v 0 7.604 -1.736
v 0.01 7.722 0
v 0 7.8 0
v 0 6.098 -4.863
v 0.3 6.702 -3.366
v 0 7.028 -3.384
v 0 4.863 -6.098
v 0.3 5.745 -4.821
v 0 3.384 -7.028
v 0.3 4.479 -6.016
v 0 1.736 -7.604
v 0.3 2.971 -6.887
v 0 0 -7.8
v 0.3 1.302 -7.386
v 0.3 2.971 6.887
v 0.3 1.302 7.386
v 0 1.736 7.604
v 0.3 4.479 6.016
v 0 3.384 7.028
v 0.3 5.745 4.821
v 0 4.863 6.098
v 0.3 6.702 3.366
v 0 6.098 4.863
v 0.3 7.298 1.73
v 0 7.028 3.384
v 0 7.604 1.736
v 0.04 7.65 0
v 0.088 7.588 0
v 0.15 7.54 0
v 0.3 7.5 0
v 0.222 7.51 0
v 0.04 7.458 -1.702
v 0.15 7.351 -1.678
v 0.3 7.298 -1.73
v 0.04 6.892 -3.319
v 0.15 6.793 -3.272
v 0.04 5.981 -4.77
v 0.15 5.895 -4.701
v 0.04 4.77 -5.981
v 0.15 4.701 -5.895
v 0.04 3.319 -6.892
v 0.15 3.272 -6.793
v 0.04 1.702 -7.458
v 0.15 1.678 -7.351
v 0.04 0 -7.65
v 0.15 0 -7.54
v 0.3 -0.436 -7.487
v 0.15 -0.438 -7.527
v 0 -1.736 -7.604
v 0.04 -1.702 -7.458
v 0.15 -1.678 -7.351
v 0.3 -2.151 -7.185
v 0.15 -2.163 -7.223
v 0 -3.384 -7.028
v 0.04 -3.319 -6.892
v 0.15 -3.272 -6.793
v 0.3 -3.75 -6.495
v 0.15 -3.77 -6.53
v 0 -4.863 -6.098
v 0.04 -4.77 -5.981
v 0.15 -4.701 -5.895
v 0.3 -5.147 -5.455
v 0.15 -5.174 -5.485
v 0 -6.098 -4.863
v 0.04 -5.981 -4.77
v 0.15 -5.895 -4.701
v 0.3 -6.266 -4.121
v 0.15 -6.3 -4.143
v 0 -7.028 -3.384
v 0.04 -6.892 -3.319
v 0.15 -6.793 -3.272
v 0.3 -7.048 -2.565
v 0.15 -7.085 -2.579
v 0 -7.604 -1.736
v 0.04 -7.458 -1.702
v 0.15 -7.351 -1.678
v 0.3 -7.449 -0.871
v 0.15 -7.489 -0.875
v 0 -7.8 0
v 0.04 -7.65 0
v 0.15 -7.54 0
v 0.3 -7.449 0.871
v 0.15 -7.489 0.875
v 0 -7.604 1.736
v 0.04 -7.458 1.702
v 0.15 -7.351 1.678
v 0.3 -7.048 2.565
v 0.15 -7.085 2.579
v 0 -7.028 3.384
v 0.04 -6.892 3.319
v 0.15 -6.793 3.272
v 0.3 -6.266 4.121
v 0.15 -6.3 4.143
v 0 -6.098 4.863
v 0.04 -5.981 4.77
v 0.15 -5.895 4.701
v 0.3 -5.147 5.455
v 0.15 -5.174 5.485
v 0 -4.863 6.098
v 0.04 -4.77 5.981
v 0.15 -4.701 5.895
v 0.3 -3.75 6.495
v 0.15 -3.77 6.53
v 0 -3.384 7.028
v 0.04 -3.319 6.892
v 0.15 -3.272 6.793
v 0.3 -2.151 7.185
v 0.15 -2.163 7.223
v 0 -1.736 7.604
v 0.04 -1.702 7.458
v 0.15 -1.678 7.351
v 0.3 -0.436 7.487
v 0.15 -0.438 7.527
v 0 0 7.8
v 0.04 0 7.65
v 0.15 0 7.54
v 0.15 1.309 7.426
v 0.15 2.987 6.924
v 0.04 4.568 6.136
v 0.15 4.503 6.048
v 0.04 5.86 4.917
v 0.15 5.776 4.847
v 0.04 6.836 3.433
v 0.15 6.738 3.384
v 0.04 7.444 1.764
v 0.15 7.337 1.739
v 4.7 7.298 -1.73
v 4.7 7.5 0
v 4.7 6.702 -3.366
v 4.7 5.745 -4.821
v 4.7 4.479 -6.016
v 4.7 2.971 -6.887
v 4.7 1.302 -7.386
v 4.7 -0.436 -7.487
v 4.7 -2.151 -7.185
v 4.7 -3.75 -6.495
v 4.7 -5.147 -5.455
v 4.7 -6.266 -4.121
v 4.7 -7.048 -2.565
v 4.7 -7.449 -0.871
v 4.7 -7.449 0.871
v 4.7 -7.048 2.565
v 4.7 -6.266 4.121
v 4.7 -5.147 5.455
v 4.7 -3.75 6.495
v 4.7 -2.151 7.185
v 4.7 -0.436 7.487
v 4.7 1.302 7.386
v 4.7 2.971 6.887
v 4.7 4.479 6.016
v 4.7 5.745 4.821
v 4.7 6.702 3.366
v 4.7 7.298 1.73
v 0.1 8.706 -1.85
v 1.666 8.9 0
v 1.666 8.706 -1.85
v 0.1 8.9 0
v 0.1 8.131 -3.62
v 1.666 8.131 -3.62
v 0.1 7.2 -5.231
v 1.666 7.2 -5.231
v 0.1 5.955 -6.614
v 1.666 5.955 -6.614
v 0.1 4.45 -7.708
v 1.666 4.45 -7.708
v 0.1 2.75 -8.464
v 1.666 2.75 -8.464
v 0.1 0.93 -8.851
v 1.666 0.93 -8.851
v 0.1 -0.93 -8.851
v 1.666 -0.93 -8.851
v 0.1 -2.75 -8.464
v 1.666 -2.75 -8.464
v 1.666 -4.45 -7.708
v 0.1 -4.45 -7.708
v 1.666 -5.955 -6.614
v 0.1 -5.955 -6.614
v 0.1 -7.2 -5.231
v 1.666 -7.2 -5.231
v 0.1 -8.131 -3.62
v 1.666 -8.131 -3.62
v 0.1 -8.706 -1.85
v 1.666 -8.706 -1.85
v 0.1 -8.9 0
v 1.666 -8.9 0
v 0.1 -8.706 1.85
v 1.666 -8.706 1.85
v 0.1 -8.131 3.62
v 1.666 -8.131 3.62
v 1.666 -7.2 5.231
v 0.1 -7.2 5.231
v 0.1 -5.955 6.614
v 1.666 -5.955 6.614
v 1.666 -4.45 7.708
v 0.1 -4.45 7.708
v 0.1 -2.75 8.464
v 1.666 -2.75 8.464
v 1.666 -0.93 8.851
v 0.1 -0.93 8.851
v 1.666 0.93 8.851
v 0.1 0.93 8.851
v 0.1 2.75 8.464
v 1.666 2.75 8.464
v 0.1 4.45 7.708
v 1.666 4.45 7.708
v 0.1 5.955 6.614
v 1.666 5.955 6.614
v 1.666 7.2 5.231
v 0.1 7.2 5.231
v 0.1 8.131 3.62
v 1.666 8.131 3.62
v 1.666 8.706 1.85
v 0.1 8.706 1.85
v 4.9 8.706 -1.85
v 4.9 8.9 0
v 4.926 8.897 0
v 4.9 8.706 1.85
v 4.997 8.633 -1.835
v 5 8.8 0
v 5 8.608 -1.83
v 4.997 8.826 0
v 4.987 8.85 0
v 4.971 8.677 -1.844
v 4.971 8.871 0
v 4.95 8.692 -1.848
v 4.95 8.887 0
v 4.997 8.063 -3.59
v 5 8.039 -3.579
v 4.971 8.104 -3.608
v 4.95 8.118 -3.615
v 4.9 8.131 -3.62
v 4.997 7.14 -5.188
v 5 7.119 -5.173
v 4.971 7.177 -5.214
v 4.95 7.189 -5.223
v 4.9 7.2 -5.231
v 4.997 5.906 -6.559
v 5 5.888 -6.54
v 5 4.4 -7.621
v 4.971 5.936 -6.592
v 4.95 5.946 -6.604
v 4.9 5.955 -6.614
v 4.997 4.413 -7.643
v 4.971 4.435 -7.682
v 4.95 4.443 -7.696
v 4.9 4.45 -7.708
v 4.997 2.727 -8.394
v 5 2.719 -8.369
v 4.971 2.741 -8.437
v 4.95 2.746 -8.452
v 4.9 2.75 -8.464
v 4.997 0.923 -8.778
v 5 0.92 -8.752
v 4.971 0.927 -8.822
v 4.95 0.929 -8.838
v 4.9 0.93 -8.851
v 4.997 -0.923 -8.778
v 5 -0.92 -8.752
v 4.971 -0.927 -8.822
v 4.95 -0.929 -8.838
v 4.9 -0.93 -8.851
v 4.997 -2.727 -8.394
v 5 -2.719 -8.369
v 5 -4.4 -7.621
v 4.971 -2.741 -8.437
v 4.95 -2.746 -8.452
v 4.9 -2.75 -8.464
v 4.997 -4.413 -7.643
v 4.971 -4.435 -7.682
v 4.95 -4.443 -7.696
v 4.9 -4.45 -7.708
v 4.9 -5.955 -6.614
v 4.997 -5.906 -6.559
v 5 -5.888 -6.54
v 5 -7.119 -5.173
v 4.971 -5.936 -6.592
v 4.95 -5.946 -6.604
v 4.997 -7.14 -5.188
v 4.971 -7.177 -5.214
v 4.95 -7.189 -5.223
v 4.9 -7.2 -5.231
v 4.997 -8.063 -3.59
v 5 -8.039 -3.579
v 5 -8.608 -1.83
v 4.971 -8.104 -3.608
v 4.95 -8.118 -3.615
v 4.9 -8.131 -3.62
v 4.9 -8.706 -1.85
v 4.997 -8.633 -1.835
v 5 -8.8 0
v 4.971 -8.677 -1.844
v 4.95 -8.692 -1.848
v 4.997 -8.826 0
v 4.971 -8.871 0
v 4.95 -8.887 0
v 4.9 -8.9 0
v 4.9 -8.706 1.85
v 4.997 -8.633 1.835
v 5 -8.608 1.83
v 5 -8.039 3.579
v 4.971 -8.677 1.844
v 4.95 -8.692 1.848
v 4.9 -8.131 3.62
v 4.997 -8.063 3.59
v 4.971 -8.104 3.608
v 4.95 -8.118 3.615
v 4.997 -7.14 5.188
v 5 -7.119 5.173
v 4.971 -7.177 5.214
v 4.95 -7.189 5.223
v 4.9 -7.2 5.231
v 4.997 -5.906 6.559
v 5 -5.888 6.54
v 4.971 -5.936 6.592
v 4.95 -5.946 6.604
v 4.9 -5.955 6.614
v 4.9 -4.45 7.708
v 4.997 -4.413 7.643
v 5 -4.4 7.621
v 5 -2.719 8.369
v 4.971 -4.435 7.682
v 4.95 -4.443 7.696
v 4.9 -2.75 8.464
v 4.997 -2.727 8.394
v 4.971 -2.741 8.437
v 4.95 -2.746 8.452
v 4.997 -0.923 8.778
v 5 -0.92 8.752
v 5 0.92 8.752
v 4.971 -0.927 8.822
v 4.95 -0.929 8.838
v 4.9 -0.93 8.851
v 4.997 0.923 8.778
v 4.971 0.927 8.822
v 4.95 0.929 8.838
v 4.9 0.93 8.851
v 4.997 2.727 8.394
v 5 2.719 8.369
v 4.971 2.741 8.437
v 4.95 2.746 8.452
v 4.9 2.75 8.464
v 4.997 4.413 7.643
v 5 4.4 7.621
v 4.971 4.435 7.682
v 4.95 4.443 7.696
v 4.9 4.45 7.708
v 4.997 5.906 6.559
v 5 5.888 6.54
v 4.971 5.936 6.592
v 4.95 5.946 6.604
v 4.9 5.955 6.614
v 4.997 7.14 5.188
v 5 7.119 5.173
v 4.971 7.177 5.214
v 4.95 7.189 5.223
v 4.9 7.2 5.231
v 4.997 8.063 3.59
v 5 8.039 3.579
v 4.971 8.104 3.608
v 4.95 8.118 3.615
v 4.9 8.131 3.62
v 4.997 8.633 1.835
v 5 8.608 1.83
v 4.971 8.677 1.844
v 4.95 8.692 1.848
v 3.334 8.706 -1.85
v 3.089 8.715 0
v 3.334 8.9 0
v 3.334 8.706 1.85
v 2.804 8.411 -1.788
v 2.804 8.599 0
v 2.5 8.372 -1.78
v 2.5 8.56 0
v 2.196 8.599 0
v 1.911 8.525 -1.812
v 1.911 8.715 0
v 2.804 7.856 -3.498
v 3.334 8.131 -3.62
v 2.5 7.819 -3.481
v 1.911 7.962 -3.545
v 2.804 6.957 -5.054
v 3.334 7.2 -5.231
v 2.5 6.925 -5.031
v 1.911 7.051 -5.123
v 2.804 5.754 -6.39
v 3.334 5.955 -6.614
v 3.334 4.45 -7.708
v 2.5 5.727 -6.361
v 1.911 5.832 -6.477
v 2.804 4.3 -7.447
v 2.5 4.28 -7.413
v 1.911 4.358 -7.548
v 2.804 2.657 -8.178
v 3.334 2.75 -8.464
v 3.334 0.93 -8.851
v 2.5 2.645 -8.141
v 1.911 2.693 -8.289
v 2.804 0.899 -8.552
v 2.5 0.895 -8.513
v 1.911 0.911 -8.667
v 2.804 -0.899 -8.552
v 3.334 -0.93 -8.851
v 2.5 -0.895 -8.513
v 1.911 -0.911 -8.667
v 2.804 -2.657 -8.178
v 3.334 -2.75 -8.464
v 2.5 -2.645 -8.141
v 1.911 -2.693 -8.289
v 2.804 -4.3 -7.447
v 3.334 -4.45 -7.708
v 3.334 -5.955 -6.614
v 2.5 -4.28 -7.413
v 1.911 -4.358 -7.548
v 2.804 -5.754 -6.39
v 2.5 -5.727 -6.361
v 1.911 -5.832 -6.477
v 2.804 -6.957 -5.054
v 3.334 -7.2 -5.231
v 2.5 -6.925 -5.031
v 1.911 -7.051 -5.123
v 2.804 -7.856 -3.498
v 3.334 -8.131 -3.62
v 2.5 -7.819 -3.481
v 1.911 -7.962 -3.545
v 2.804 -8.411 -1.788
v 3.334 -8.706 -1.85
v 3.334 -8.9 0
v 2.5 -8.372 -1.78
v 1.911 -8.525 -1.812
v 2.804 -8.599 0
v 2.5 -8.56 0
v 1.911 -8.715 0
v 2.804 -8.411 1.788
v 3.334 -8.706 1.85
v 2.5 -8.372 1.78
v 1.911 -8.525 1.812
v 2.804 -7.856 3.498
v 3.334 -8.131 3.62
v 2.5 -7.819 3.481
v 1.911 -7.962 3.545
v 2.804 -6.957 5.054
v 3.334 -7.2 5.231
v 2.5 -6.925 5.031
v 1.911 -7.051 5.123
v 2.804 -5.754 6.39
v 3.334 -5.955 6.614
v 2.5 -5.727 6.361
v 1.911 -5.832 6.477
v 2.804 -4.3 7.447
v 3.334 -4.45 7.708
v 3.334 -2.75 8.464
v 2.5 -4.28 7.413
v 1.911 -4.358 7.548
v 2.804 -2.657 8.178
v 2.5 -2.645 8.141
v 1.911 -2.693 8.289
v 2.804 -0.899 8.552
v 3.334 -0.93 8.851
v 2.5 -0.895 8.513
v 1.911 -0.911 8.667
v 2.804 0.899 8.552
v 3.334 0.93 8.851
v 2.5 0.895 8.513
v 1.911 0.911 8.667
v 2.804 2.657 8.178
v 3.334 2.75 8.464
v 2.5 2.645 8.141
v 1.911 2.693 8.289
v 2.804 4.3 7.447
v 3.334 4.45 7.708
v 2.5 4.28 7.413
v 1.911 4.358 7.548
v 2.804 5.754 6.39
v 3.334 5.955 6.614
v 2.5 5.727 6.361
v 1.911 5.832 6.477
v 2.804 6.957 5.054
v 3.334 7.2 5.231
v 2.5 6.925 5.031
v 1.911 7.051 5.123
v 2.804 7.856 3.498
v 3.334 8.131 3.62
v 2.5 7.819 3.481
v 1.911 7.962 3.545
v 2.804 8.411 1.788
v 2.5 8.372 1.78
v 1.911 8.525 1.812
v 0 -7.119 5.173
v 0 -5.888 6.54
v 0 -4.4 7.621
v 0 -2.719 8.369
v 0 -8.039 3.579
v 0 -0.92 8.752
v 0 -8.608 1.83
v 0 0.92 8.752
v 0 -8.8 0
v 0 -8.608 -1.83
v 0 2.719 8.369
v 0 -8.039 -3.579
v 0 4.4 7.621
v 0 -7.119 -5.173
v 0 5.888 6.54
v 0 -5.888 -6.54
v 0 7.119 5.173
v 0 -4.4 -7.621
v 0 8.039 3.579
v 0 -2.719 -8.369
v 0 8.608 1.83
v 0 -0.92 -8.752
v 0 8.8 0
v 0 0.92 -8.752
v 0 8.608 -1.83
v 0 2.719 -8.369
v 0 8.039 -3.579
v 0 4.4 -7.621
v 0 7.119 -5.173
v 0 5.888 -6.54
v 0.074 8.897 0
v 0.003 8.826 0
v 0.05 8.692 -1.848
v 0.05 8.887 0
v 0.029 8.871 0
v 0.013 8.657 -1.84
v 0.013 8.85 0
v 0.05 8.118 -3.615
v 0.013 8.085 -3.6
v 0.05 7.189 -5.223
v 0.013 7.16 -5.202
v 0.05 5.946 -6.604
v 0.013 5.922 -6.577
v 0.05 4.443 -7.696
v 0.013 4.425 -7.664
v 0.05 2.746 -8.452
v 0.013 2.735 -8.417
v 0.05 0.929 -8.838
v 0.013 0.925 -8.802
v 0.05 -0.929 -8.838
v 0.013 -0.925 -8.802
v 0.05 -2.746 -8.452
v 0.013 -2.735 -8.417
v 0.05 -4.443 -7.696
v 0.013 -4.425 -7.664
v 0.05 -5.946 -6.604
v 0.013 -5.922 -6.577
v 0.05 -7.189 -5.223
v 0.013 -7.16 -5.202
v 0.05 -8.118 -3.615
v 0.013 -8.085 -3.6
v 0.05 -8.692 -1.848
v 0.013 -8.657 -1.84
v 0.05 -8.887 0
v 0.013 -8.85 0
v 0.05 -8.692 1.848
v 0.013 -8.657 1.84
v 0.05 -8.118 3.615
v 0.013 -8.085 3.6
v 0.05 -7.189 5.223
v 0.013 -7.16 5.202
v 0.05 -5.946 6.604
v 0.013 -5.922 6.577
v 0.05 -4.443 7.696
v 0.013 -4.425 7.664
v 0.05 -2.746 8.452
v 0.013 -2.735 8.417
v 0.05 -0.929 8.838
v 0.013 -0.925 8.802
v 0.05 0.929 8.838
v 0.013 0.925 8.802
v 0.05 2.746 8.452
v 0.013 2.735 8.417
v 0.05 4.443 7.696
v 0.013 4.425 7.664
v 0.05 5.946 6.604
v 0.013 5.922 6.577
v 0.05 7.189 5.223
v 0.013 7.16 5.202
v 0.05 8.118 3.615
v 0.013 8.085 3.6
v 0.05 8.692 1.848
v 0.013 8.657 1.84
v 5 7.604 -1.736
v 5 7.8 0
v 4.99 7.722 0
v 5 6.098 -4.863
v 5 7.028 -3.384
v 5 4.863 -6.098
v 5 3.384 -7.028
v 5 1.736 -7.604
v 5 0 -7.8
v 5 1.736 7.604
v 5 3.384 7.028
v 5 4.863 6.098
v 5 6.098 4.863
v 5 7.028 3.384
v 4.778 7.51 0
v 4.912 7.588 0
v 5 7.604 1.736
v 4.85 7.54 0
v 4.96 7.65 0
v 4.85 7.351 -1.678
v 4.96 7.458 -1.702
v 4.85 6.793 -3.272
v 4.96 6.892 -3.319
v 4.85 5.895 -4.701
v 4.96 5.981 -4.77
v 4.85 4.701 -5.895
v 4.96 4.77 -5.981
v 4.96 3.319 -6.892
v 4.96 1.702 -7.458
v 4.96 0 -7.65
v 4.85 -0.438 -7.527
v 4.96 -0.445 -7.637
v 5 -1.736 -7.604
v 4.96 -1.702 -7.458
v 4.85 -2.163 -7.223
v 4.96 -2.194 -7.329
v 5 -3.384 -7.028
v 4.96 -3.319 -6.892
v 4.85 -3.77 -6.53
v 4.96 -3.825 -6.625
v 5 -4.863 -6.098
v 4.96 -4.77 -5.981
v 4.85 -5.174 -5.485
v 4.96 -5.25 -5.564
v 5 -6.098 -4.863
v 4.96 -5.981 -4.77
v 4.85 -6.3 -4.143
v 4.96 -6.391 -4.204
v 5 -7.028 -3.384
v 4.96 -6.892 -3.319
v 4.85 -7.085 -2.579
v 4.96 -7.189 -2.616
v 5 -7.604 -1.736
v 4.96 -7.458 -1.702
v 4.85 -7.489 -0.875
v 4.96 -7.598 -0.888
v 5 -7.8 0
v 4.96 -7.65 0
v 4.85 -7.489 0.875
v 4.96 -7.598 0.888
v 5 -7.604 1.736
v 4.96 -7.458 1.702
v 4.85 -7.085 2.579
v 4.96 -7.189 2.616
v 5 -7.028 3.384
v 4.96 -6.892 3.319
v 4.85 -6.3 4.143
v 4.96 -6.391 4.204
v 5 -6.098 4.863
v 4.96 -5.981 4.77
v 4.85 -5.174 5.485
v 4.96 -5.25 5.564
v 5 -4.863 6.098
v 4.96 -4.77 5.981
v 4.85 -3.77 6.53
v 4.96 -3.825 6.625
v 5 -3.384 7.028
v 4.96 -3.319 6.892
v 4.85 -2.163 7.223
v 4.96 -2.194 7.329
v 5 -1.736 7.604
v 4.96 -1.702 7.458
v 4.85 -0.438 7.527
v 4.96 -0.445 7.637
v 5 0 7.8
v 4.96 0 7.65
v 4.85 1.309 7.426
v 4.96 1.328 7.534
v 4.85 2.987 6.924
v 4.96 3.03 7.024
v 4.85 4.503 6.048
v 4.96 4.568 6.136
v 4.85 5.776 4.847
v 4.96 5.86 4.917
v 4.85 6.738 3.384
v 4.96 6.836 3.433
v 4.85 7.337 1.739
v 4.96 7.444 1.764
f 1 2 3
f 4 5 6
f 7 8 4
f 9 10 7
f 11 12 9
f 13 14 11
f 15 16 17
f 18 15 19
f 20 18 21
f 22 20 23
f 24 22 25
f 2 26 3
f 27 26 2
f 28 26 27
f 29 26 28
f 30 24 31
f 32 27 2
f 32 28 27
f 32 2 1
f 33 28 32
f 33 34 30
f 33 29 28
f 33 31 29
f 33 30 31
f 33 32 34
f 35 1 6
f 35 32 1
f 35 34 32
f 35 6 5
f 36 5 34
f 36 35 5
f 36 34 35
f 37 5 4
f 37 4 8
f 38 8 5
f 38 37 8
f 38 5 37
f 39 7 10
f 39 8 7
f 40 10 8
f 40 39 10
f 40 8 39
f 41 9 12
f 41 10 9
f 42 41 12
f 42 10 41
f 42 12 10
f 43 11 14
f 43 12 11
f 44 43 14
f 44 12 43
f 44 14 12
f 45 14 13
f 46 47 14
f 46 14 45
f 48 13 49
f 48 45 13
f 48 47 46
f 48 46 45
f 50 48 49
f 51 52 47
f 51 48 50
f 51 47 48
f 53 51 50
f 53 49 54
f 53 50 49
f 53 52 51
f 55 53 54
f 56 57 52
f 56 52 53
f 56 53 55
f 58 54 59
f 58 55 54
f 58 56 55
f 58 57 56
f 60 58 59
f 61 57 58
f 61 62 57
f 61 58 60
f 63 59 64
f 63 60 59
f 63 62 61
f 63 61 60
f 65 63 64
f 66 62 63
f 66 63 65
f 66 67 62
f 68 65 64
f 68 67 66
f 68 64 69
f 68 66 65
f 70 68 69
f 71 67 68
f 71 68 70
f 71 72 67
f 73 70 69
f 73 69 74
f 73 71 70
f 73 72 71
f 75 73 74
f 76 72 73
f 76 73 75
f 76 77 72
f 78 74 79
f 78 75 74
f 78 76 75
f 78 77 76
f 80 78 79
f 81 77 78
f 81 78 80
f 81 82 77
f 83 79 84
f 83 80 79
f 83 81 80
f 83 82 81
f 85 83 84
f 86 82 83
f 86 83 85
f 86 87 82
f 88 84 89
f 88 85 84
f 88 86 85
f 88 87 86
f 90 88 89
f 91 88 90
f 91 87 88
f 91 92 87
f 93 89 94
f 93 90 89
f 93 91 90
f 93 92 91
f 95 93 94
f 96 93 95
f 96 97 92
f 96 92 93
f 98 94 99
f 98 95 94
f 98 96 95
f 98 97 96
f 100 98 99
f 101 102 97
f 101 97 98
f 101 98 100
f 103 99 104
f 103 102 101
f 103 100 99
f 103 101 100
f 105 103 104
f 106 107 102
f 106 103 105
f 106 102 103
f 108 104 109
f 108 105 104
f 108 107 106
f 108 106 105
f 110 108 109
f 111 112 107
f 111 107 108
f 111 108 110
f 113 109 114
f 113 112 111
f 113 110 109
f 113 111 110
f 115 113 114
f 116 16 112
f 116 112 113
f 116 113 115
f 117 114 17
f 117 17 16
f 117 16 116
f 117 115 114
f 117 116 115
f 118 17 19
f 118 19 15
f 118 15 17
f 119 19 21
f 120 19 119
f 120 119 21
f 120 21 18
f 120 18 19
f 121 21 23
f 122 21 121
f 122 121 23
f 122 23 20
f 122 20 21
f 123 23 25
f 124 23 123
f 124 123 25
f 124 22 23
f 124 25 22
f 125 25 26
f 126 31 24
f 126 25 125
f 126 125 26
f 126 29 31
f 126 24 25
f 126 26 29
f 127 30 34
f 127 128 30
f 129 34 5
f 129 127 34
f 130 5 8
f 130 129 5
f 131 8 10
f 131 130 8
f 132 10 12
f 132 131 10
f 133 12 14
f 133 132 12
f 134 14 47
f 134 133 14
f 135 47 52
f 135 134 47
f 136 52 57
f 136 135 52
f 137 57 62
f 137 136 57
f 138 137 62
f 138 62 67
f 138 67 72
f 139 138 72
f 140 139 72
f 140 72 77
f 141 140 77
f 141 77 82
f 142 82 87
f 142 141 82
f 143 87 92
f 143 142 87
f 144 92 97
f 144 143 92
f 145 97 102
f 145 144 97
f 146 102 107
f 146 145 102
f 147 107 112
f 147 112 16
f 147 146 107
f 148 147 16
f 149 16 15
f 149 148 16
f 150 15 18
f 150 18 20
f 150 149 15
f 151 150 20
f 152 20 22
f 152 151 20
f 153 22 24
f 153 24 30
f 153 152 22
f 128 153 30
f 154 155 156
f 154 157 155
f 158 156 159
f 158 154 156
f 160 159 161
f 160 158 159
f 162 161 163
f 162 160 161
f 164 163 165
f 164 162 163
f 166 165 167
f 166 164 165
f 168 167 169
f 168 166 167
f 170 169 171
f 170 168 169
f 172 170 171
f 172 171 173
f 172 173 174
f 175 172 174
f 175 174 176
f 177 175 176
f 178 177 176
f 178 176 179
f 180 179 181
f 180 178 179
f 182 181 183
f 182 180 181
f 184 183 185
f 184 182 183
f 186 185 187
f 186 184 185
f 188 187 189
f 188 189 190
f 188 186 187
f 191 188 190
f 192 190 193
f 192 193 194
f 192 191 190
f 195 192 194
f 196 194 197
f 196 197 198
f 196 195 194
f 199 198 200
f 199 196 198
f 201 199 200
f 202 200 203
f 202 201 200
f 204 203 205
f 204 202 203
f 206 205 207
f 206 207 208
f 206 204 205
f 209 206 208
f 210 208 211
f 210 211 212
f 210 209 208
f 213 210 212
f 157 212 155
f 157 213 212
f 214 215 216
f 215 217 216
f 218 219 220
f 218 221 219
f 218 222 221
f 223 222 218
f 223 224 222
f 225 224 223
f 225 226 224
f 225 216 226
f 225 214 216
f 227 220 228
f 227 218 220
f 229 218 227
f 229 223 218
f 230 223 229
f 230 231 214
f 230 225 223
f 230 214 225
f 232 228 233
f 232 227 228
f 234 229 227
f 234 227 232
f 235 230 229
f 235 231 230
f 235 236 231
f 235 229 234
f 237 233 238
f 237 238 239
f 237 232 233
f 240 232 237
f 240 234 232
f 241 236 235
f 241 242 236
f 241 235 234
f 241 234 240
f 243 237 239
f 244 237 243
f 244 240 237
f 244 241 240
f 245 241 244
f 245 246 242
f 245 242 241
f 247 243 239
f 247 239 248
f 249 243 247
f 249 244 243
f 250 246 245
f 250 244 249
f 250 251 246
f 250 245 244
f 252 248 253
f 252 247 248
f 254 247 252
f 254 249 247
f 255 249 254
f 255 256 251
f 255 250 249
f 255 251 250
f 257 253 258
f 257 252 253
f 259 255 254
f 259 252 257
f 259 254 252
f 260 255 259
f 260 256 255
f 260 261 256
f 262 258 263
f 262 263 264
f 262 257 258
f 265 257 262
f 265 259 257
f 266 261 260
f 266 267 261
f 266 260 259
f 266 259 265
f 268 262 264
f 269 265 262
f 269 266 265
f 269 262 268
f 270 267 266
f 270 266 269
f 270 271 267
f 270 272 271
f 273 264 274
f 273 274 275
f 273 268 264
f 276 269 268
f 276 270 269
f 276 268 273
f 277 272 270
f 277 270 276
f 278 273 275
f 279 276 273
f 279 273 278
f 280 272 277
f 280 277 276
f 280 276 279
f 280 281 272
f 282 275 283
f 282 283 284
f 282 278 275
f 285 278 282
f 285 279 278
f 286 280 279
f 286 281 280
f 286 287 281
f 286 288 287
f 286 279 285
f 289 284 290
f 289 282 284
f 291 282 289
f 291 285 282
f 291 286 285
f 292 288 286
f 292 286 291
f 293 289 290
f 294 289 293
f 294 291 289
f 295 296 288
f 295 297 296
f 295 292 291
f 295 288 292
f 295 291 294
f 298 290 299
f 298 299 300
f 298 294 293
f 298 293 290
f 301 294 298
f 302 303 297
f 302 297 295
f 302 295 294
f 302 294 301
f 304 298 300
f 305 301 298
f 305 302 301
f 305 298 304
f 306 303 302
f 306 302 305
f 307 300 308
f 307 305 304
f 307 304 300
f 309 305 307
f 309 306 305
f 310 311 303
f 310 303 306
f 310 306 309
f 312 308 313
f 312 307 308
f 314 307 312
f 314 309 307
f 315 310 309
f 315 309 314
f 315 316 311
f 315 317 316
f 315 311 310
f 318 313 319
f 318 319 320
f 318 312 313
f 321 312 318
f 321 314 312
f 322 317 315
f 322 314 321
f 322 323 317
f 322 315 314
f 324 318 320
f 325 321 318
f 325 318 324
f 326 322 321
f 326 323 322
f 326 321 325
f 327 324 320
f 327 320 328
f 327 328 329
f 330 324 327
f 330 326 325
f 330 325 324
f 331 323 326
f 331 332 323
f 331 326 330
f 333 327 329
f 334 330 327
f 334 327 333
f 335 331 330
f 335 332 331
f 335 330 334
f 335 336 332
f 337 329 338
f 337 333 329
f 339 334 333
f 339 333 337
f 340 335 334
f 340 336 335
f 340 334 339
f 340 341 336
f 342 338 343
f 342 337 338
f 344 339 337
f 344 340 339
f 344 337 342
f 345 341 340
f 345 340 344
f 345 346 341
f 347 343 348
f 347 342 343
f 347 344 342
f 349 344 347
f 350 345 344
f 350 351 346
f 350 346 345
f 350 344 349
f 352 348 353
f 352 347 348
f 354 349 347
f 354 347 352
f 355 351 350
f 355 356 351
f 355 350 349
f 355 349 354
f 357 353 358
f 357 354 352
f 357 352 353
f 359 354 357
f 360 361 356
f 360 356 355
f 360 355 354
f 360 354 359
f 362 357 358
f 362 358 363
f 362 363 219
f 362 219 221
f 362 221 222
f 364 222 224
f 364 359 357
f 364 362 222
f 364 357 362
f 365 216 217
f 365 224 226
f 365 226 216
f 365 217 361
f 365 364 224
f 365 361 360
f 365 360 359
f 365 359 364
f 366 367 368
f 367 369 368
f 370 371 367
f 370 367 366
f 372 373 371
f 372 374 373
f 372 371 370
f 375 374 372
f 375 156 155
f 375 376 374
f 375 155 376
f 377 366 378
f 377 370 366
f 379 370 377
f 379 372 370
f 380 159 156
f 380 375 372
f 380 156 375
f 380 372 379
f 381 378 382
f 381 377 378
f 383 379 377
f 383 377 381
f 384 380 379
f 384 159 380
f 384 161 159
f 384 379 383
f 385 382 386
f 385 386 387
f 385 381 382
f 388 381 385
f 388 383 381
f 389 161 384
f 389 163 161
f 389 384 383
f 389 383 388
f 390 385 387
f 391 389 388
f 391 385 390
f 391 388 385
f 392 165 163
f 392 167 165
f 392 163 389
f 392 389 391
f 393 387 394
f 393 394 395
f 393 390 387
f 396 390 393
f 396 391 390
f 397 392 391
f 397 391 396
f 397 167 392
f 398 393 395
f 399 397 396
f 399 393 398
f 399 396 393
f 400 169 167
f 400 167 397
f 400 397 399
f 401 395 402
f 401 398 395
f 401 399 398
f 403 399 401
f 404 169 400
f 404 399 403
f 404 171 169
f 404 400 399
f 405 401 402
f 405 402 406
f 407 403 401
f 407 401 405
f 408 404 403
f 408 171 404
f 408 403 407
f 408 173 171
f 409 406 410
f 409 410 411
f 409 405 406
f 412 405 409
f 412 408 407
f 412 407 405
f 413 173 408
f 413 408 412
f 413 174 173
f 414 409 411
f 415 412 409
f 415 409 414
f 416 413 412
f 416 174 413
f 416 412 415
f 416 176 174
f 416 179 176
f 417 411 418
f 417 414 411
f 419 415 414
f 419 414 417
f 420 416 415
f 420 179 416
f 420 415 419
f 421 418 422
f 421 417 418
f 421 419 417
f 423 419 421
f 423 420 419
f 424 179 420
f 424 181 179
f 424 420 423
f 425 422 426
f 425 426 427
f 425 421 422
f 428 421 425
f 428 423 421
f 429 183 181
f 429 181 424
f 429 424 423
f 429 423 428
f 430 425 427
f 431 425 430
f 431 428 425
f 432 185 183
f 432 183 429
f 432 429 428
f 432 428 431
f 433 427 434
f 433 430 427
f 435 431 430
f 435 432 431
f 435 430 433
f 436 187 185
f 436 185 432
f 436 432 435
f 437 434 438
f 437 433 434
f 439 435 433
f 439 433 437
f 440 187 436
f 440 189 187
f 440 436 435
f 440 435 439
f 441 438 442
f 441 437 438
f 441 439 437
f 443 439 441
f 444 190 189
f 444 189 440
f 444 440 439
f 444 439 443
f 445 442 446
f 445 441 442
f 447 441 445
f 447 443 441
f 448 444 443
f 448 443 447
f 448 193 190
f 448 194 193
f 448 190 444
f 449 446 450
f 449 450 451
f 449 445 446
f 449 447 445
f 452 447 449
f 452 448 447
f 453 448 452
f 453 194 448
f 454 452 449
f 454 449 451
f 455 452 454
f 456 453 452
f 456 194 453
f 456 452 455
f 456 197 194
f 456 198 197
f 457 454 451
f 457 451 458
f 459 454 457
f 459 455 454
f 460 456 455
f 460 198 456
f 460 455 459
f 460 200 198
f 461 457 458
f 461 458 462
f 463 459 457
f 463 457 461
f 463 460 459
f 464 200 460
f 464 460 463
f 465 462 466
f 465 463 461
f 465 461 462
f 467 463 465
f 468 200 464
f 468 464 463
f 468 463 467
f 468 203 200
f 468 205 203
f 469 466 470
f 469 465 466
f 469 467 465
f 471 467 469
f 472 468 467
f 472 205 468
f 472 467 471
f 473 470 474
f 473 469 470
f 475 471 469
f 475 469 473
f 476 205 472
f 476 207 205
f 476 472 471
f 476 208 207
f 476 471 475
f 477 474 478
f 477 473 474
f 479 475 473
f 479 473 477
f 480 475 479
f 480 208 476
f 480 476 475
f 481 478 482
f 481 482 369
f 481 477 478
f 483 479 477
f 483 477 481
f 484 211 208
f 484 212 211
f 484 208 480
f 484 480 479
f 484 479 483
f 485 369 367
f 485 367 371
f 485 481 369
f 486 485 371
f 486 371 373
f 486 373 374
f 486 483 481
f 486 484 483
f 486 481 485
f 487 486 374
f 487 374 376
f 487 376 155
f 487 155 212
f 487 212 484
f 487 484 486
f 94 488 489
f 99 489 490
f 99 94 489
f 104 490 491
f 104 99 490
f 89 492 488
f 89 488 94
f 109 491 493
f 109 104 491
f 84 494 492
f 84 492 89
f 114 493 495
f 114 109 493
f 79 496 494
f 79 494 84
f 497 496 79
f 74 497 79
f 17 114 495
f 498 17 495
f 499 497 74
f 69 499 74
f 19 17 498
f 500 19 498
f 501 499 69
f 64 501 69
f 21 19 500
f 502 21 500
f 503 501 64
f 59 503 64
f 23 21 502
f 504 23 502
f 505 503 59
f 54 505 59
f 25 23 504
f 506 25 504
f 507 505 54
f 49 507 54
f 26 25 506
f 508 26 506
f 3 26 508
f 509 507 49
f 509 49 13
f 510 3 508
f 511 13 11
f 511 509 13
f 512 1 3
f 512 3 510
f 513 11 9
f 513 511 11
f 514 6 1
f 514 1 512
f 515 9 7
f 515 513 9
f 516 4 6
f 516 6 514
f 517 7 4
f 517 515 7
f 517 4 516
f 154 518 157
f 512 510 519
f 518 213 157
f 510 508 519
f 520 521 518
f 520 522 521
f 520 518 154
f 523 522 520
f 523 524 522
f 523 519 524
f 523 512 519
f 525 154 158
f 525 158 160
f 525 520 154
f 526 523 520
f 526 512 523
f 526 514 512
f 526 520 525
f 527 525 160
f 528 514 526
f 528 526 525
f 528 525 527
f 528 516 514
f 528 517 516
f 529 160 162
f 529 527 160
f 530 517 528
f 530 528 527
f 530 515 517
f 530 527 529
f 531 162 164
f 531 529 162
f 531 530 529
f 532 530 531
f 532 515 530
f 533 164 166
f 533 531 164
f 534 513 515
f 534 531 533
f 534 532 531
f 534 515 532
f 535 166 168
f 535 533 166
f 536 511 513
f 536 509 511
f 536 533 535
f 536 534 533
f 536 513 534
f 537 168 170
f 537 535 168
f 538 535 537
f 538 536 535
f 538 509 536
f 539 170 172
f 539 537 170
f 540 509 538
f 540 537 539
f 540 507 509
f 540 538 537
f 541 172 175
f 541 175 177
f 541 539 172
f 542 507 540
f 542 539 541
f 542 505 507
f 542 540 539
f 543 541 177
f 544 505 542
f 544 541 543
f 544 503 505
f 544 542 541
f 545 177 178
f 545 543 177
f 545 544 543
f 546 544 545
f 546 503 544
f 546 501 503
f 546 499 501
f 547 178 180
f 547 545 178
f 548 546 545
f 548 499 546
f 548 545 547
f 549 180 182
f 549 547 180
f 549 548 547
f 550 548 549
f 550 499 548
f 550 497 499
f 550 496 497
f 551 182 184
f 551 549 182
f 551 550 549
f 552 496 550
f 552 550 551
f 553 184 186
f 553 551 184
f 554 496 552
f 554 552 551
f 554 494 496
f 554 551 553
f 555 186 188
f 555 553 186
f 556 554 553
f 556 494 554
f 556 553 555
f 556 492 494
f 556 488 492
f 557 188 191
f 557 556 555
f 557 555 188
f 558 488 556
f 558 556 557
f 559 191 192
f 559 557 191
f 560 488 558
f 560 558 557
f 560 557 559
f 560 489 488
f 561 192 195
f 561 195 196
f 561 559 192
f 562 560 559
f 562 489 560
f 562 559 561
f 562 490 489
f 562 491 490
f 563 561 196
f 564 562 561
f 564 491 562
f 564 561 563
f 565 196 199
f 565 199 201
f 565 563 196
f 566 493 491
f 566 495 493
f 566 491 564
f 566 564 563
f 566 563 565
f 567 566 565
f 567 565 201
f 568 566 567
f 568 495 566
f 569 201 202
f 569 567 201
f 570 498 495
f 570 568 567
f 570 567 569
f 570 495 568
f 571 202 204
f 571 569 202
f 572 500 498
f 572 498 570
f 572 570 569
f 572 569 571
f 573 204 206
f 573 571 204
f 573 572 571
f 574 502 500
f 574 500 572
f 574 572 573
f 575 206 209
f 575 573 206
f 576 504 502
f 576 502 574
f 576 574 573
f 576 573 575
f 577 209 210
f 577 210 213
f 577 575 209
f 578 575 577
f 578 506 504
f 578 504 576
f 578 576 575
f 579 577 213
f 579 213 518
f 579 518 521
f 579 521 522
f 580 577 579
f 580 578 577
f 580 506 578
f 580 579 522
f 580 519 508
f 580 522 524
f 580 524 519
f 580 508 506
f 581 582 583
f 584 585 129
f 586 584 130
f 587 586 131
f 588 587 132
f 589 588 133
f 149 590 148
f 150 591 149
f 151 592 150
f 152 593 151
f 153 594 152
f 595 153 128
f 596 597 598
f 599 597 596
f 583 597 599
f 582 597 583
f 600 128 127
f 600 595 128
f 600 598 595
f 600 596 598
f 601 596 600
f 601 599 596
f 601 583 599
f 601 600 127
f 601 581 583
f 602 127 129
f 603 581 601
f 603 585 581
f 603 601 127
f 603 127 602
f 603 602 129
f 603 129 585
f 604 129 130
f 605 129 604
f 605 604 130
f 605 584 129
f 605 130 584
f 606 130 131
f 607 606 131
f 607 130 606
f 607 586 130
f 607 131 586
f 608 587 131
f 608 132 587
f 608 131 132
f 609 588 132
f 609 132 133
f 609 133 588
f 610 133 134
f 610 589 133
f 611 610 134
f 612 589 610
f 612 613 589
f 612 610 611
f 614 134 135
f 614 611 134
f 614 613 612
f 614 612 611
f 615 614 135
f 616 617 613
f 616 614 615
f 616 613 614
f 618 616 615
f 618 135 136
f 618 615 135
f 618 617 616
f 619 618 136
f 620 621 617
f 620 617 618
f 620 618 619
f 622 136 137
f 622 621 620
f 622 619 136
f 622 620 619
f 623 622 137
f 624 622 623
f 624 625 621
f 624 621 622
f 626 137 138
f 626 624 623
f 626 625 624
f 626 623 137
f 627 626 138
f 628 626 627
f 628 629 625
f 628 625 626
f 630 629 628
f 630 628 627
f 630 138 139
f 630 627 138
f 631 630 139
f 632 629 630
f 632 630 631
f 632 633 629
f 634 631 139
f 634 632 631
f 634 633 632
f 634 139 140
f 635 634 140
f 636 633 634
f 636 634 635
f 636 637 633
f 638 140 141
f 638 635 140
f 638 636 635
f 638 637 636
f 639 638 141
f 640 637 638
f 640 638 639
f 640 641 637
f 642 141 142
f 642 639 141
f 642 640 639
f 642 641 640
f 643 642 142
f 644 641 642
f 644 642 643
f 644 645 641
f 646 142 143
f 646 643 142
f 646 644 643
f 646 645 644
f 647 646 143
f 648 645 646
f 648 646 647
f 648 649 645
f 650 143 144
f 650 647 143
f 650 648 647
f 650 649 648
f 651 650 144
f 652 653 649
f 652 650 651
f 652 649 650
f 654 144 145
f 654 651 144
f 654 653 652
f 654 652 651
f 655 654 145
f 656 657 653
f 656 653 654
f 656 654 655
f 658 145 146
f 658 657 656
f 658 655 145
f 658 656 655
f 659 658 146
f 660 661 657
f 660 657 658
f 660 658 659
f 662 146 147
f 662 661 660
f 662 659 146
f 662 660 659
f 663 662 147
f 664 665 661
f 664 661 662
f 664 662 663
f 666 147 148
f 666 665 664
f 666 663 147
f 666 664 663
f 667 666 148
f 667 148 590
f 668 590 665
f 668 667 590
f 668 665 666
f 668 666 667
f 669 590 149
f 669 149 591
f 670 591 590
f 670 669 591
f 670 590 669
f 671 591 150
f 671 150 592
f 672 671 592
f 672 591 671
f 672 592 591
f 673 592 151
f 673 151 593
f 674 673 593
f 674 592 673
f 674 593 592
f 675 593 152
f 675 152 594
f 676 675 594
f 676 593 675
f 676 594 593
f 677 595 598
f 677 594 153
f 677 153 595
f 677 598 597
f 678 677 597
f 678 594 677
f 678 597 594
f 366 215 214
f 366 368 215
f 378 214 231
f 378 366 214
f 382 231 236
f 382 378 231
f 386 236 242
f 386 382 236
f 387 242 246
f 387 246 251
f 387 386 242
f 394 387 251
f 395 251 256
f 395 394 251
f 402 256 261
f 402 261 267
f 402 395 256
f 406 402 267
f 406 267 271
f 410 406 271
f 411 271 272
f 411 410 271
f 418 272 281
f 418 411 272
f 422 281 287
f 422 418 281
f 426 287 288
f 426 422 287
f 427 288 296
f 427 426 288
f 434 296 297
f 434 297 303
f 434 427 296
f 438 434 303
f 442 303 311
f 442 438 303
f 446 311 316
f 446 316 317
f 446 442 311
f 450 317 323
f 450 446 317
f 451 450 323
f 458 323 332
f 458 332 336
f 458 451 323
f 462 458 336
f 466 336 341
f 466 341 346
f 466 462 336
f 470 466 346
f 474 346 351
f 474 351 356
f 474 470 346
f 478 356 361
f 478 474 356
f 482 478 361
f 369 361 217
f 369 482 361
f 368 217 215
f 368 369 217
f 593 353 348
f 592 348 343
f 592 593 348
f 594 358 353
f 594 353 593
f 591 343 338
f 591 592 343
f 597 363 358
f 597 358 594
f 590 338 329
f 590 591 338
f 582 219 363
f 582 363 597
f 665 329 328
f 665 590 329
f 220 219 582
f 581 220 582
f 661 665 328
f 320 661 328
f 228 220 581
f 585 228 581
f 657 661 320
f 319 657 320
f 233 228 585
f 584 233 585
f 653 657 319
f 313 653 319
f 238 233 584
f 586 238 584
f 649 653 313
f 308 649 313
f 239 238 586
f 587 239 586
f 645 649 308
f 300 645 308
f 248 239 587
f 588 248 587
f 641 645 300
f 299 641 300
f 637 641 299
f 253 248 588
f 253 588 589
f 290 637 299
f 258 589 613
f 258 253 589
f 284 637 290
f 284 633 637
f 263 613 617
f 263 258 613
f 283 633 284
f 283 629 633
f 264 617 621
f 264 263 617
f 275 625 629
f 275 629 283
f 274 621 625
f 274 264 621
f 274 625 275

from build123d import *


with BuildPart() as part:
    # 草图1 → 旋转1 (revolve)
    with BuildSketch(Plane.XY):
        with BuildLine():
            Line((0, 8.8), (0, 7.8))
            ThreePointArc((0, 7.8), (0.087867966, 7.587867966), (0.3, 7.5))
            Line((0.3, 7.5), (4.7, 7.5))
            ThreePointArc((4.7, 7.5), (4.912132034, 7.587867966), (5, 7.8))
            Line((5, 7.8), (5, 8.8))
            ThreePointArc((5, 8.8), (4.970710678, 8.870710678), (4.9, 8.9))
            Line((4.9, 8.9), (3.333540791, 8.9))
            ThreePointArc((3.333540791, 8.9), (2.5, 8.5595), (1.666459209, 8.9))
            Line((1.666459209, 8.9), (0.1, 8.9))
            ThreePointArc((0.1, 8.9), (0.029289322, 8.870710678), (0, 8.8))
        make_face()
    revolve(axis=Axis((50, 0, 0), (-1, 0, 0)))


solid = part.part
